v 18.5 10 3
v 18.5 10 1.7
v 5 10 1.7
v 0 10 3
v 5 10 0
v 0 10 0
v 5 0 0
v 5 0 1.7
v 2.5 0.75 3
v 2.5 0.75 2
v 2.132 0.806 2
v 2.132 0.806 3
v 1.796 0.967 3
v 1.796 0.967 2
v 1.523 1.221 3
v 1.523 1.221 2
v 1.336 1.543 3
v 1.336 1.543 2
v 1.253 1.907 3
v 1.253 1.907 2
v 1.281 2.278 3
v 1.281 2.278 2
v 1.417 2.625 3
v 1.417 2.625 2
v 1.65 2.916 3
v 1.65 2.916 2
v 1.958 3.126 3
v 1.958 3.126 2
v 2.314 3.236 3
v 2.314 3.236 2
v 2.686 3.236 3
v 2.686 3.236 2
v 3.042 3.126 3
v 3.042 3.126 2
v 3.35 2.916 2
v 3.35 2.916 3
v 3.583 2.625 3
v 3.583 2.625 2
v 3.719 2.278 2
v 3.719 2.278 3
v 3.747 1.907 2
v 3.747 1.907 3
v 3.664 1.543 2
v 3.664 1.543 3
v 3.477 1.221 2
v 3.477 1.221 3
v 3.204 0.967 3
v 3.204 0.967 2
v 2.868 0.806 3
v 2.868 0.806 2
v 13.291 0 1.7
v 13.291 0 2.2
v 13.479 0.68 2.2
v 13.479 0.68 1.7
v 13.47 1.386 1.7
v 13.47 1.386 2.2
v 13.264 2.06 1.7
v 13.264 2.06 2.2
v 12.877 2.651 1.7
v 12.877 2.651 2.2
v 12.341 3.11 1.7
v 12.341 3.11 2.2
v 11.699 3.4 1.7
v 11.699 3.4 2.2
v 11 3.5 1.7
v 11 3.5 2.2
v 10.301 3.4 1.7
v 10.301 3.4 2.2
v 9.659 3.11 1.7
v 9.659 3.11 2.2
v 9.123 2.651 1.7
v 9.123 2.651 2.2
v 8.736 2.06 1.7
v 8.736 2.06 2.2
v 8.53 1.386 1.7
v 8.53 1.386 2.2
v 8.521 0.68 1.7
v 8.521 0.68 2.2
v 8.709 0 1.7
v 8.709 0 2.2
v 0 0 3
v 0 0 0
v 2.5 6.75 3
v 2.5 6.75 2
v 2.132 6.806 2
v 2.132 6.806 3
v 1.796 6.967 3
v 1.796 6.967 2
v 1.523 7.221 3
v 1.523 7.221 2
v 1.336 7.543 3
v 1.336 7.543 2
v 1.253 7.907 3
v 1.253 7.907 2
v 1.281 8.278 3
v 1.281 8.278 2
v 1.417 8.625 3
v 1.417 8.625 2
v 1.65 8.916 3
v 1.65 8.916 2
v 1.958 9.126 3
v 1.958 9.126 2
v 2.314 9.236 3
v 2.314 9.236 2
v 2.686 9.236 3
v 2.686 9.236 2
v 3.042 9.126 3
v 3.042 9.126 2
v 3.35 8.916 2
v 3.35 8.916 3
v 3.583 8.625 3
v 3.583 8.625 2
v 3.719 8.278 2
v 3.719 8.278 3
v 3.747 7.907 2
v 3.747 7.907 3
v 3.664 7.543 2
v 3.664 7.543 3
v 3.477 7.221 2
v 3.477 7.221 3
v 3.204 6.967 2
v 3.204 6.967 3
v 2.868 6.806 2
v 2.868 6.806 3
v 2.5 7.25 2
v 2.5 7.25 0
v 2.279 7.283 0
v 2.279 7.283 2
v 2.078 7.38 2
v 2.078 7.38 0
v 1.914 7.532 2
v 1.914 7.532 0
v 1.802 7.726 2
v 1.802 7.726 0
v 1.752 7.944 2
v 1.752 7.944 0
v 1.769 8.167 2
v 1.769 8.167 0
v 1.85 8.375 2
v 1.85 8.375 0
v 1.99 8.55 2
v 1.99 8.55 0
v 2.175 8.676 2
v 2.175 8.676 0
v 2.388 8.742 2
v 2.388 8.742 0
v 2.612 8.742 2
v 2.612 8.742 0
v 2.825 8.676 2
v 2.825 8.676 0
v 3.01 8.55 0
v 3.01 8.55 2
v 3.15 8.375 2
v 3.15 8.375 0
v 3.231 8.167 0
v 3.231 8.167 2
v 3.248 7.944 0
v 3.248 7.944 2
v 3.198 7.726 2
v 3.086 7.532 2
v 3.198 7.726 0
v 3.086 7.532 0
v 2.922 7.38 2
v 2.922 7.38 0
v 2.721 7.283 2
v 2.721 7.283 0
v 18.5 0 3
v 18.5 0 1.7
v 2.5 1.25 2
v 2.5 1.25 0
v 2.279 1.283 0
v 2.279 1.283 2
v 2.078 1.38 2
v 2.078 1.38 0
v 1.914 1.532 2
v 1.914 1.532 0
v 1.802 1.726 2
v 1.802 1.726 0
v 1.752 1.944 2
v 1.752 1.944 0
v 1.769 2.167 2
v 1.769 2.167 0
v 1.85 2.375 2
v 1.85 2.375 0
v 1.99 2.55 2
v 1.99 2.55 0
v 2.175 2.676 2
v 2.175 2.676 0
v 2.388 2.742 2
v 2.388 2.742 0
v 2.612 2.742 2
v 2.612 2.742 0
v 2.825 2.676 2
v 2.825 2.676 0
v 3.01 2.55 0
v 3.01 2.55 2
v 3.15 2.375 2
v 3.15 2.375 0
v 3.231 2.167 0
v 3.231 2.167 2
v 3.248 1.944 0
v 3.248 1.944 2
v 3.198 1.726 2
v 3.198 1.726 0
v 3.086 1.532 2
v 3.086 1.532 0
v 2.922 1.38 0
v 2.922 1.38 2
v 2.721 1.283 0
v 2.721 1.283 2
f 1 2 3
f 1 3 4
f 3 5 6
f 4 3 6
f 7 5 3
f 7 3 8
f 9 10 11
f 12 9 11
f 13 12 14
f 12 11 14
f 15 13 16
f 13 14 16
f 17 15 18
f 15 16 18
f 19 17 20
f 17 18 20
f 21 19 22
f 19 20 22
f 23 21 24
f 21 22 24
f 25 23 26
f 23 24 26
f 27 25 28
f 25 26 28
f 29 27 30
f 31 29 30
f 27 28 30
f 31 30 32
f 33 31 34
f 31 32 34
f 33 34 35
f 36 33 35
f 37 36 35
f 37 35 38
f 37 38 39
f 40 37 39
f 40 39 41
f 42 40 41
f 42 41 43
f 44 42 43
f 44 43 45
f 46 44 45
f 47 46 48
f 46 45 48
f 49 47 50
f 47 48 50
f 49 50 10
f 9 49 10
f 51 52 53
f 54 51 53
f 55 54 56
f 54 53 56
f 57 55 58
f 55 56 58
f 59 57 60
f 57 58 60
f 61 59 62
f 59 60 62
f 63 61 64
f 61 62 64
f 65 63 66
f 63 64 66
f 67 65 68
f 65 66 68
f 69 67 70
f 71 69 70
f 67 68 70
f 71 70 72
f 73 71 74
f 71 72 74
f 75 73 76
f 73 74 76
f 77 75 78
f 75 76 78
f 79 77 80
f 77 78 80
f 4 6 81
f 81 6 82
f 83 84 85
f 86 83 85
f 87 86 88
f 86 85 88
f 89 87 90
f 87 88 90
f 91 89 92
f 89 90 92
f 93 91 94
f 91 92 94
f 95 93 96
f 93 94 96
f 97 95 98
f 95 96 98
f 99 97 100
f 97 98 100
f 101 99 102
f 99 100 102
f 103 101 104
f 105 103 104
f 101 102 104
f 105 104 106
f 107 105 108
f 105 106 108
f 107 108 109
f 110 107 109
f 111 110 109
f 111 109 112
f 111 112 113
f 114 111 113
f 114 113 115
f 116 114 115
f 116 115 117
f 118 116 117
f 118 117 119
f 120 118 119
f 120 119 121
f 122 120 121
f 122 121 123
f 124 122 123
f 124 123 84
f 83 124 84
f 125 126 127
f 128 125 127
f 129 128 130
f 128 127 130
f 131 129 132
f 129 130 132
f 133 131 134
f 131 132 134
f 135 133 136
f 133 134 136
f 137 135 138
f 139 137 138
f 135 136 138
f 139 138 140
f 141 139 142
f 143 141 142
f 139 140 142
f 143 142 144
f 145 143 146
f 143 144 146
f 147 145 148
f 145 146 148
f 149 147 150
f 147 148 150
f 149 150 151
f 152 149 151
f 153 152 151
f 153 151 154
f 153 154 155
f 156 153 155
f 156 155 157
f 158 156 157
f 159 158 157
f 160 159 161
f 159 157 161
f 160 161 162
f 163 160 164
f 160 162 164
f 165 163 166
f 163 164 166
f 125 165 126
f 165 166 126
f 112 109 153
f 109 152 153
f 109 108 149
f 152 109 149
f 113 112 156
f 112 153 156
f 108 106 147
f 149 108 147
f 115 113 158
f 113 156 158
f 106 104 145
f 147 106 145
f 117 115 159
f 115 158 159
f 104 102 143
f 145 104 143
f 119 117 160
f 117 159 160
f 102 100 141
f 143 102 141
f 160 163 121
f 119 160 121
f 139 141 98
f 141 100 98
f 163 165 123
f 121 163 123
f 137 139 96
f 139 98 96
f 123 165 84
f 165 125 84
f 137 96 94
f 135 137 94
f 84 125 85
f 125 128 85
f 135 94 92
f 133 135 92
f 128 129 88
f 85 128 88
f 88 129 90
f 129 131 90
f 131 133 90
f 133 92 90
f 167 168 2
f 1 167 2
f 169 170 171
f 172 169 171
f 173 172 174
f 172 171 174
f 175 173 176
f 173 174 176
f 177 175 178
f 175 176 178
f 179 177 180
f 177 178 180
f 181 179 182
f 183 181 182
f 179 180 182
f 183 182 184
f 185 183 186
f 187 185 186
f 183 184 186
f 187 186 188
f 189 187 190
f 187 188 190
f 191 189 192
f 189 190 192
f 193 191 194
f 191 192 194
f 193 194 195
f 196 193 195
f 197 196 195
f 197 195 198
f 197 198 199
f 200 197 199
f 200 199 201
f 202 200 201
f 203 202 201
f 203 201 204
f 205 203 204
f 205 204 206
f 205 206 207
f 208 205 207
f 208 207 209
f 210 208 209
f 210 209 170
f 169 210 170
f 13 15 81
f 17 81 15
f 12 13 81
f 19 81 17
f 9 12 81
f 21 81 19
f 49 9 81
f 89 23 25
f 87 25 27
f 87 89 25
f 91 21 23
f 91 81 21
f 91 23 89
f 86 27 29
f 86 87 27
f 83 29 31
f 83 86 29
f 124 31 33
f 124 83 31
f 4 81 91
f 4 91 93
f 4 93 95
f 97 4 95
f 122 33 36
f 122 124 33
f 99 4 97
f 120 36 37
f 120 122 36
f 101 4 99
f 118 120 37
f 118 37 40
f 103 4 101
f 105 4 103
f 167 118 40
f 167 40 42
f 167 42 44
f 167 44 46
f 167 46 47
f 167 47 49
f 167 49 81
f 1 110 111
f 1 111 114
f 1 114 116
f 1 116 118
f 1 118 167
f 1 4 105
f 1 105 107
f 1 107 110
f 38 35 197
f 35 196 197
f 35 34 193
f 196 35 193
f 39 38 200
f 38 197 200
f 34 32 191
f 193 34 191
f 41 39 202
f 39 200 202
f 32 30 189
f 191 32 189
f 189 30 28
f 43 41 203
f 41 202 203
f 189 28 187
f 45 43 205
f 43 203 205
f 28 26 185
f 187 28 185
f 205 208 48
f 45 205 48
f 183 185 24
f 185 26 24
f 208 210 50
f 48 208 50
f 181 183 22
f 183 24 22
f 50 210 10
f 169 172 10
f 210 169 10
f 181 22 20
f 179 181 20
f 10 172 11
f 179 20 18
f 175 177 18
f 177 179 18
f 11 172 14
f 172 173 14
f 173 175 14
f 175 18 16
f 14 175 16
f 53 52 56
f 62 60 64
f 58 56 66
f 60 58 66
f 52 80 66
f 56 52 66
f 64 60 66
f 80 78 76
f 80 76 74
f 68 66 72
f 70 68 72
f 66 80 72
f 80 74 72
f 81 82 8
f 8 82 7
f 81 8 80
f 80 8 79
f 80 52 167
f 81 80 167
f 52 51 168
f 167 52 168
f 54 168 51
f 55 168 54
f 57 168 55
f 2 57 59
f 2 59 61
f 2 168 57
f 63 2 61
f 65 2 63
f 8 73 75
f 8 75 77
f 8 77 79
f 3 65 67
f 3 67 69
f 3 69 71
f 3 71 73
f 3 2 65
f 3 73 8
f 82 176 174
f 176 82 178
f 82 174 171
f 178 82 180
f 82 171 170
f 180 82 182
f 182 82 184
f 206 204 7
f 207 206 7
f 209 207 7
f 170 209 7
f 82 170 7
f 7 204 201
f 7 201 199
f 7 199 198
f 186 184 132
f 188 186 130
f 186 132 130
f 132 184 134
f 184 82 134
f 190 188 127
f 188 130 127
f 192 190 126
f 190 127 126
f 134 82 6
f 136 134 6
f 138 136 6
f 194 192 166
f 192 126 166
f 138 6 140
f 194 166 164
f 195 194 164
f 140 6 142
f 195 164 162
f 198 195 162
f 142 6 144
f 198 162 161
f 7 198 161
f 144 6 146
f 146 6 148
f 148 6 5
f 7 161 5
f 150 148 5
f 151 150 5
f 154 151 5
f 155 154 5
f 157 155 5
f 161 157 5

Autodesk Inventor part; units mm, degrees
ref_plane "YZ Plane" through (0, 0, 0) normal (1, 0, 0) x (0, 1, 0)
ref_plane "XZ Plane" through (0, 0, 0) normal (0, 1, 0) x (-1, 0, 0)
ref_plane "XY Plane" through (0, 0, 0) normal (0, 0, 1) x (1, 0, 0)
sketch "Sketch1" plane through (0, 0, 0) normal (0, 0, 1) x (1, 0, 0)
  line L0 (0, 0) -> (18.5, 0)
  line L1 (18.5, 0) -> (18.5, 10)
  line L2 (18.5, 10) -> (0, 10)
  line L3 (0, 10) -> (0, 0)
  dimension "d0" = 18.5
  dimension "d1" = 10
extrude "Extrusion1" add sketch "Sketch1" along normal blind 3
sketch "Sketch2" plane through (0, 0, 0) normal (0, 0, -1) x (-1, 0, 0)
  line L0 (0, 0) -> (-18.5, 0) projected
  line L1 (0, 10) -> (0, 0) projected
  line L2 (-18.5, 10) -> (0, 10) projected
  line L3 (-18.5, 0) -> (-18.5, 10) projected
  line L4 (-5, 10) -> (-5, 0)
  dimension "d4" = 5
extrude "Extrusion2" cut sketch "Sketch2" against normal blind 1.7 contours L0 L3 L2 L4
sketch "Sketch3" plane through (0, 0, 3) normal (0, 0, 1) x (1, 0, 0)
  point P0 (0, 0)
  point P1 (2.5, 2)
  point P2 (2.5, 8)
  dimension "d7" = 6
  dimension "d8" = 2.5
  dimension "d9" = 2
hole "Hole1" at (2.5, 2, 3) at (2.5, 8, 3) direction (0, 0, -1) diameter 1.5 depth 8 tip angle 118 counterbore diameter 2.5 counterbore depth 1
sketch "Sketch4" plane through (0, 0, 1.7) normal (0, 0, -1) x (-1, 0, 0)
  circle A0 centre (-2.5, 2) radius 0.75 projected
  point P0 (0, 0)
  point P1 (-11, 1)
  dimension "d18" = 8.5
  dimension "d26" = 1
hole "Hole2" at (11, 1, 1.7) direction (0, 0, 1) diameter 5 depth 0.5
properties part number "thumb_03 CMC bottom angle sensor holder"
